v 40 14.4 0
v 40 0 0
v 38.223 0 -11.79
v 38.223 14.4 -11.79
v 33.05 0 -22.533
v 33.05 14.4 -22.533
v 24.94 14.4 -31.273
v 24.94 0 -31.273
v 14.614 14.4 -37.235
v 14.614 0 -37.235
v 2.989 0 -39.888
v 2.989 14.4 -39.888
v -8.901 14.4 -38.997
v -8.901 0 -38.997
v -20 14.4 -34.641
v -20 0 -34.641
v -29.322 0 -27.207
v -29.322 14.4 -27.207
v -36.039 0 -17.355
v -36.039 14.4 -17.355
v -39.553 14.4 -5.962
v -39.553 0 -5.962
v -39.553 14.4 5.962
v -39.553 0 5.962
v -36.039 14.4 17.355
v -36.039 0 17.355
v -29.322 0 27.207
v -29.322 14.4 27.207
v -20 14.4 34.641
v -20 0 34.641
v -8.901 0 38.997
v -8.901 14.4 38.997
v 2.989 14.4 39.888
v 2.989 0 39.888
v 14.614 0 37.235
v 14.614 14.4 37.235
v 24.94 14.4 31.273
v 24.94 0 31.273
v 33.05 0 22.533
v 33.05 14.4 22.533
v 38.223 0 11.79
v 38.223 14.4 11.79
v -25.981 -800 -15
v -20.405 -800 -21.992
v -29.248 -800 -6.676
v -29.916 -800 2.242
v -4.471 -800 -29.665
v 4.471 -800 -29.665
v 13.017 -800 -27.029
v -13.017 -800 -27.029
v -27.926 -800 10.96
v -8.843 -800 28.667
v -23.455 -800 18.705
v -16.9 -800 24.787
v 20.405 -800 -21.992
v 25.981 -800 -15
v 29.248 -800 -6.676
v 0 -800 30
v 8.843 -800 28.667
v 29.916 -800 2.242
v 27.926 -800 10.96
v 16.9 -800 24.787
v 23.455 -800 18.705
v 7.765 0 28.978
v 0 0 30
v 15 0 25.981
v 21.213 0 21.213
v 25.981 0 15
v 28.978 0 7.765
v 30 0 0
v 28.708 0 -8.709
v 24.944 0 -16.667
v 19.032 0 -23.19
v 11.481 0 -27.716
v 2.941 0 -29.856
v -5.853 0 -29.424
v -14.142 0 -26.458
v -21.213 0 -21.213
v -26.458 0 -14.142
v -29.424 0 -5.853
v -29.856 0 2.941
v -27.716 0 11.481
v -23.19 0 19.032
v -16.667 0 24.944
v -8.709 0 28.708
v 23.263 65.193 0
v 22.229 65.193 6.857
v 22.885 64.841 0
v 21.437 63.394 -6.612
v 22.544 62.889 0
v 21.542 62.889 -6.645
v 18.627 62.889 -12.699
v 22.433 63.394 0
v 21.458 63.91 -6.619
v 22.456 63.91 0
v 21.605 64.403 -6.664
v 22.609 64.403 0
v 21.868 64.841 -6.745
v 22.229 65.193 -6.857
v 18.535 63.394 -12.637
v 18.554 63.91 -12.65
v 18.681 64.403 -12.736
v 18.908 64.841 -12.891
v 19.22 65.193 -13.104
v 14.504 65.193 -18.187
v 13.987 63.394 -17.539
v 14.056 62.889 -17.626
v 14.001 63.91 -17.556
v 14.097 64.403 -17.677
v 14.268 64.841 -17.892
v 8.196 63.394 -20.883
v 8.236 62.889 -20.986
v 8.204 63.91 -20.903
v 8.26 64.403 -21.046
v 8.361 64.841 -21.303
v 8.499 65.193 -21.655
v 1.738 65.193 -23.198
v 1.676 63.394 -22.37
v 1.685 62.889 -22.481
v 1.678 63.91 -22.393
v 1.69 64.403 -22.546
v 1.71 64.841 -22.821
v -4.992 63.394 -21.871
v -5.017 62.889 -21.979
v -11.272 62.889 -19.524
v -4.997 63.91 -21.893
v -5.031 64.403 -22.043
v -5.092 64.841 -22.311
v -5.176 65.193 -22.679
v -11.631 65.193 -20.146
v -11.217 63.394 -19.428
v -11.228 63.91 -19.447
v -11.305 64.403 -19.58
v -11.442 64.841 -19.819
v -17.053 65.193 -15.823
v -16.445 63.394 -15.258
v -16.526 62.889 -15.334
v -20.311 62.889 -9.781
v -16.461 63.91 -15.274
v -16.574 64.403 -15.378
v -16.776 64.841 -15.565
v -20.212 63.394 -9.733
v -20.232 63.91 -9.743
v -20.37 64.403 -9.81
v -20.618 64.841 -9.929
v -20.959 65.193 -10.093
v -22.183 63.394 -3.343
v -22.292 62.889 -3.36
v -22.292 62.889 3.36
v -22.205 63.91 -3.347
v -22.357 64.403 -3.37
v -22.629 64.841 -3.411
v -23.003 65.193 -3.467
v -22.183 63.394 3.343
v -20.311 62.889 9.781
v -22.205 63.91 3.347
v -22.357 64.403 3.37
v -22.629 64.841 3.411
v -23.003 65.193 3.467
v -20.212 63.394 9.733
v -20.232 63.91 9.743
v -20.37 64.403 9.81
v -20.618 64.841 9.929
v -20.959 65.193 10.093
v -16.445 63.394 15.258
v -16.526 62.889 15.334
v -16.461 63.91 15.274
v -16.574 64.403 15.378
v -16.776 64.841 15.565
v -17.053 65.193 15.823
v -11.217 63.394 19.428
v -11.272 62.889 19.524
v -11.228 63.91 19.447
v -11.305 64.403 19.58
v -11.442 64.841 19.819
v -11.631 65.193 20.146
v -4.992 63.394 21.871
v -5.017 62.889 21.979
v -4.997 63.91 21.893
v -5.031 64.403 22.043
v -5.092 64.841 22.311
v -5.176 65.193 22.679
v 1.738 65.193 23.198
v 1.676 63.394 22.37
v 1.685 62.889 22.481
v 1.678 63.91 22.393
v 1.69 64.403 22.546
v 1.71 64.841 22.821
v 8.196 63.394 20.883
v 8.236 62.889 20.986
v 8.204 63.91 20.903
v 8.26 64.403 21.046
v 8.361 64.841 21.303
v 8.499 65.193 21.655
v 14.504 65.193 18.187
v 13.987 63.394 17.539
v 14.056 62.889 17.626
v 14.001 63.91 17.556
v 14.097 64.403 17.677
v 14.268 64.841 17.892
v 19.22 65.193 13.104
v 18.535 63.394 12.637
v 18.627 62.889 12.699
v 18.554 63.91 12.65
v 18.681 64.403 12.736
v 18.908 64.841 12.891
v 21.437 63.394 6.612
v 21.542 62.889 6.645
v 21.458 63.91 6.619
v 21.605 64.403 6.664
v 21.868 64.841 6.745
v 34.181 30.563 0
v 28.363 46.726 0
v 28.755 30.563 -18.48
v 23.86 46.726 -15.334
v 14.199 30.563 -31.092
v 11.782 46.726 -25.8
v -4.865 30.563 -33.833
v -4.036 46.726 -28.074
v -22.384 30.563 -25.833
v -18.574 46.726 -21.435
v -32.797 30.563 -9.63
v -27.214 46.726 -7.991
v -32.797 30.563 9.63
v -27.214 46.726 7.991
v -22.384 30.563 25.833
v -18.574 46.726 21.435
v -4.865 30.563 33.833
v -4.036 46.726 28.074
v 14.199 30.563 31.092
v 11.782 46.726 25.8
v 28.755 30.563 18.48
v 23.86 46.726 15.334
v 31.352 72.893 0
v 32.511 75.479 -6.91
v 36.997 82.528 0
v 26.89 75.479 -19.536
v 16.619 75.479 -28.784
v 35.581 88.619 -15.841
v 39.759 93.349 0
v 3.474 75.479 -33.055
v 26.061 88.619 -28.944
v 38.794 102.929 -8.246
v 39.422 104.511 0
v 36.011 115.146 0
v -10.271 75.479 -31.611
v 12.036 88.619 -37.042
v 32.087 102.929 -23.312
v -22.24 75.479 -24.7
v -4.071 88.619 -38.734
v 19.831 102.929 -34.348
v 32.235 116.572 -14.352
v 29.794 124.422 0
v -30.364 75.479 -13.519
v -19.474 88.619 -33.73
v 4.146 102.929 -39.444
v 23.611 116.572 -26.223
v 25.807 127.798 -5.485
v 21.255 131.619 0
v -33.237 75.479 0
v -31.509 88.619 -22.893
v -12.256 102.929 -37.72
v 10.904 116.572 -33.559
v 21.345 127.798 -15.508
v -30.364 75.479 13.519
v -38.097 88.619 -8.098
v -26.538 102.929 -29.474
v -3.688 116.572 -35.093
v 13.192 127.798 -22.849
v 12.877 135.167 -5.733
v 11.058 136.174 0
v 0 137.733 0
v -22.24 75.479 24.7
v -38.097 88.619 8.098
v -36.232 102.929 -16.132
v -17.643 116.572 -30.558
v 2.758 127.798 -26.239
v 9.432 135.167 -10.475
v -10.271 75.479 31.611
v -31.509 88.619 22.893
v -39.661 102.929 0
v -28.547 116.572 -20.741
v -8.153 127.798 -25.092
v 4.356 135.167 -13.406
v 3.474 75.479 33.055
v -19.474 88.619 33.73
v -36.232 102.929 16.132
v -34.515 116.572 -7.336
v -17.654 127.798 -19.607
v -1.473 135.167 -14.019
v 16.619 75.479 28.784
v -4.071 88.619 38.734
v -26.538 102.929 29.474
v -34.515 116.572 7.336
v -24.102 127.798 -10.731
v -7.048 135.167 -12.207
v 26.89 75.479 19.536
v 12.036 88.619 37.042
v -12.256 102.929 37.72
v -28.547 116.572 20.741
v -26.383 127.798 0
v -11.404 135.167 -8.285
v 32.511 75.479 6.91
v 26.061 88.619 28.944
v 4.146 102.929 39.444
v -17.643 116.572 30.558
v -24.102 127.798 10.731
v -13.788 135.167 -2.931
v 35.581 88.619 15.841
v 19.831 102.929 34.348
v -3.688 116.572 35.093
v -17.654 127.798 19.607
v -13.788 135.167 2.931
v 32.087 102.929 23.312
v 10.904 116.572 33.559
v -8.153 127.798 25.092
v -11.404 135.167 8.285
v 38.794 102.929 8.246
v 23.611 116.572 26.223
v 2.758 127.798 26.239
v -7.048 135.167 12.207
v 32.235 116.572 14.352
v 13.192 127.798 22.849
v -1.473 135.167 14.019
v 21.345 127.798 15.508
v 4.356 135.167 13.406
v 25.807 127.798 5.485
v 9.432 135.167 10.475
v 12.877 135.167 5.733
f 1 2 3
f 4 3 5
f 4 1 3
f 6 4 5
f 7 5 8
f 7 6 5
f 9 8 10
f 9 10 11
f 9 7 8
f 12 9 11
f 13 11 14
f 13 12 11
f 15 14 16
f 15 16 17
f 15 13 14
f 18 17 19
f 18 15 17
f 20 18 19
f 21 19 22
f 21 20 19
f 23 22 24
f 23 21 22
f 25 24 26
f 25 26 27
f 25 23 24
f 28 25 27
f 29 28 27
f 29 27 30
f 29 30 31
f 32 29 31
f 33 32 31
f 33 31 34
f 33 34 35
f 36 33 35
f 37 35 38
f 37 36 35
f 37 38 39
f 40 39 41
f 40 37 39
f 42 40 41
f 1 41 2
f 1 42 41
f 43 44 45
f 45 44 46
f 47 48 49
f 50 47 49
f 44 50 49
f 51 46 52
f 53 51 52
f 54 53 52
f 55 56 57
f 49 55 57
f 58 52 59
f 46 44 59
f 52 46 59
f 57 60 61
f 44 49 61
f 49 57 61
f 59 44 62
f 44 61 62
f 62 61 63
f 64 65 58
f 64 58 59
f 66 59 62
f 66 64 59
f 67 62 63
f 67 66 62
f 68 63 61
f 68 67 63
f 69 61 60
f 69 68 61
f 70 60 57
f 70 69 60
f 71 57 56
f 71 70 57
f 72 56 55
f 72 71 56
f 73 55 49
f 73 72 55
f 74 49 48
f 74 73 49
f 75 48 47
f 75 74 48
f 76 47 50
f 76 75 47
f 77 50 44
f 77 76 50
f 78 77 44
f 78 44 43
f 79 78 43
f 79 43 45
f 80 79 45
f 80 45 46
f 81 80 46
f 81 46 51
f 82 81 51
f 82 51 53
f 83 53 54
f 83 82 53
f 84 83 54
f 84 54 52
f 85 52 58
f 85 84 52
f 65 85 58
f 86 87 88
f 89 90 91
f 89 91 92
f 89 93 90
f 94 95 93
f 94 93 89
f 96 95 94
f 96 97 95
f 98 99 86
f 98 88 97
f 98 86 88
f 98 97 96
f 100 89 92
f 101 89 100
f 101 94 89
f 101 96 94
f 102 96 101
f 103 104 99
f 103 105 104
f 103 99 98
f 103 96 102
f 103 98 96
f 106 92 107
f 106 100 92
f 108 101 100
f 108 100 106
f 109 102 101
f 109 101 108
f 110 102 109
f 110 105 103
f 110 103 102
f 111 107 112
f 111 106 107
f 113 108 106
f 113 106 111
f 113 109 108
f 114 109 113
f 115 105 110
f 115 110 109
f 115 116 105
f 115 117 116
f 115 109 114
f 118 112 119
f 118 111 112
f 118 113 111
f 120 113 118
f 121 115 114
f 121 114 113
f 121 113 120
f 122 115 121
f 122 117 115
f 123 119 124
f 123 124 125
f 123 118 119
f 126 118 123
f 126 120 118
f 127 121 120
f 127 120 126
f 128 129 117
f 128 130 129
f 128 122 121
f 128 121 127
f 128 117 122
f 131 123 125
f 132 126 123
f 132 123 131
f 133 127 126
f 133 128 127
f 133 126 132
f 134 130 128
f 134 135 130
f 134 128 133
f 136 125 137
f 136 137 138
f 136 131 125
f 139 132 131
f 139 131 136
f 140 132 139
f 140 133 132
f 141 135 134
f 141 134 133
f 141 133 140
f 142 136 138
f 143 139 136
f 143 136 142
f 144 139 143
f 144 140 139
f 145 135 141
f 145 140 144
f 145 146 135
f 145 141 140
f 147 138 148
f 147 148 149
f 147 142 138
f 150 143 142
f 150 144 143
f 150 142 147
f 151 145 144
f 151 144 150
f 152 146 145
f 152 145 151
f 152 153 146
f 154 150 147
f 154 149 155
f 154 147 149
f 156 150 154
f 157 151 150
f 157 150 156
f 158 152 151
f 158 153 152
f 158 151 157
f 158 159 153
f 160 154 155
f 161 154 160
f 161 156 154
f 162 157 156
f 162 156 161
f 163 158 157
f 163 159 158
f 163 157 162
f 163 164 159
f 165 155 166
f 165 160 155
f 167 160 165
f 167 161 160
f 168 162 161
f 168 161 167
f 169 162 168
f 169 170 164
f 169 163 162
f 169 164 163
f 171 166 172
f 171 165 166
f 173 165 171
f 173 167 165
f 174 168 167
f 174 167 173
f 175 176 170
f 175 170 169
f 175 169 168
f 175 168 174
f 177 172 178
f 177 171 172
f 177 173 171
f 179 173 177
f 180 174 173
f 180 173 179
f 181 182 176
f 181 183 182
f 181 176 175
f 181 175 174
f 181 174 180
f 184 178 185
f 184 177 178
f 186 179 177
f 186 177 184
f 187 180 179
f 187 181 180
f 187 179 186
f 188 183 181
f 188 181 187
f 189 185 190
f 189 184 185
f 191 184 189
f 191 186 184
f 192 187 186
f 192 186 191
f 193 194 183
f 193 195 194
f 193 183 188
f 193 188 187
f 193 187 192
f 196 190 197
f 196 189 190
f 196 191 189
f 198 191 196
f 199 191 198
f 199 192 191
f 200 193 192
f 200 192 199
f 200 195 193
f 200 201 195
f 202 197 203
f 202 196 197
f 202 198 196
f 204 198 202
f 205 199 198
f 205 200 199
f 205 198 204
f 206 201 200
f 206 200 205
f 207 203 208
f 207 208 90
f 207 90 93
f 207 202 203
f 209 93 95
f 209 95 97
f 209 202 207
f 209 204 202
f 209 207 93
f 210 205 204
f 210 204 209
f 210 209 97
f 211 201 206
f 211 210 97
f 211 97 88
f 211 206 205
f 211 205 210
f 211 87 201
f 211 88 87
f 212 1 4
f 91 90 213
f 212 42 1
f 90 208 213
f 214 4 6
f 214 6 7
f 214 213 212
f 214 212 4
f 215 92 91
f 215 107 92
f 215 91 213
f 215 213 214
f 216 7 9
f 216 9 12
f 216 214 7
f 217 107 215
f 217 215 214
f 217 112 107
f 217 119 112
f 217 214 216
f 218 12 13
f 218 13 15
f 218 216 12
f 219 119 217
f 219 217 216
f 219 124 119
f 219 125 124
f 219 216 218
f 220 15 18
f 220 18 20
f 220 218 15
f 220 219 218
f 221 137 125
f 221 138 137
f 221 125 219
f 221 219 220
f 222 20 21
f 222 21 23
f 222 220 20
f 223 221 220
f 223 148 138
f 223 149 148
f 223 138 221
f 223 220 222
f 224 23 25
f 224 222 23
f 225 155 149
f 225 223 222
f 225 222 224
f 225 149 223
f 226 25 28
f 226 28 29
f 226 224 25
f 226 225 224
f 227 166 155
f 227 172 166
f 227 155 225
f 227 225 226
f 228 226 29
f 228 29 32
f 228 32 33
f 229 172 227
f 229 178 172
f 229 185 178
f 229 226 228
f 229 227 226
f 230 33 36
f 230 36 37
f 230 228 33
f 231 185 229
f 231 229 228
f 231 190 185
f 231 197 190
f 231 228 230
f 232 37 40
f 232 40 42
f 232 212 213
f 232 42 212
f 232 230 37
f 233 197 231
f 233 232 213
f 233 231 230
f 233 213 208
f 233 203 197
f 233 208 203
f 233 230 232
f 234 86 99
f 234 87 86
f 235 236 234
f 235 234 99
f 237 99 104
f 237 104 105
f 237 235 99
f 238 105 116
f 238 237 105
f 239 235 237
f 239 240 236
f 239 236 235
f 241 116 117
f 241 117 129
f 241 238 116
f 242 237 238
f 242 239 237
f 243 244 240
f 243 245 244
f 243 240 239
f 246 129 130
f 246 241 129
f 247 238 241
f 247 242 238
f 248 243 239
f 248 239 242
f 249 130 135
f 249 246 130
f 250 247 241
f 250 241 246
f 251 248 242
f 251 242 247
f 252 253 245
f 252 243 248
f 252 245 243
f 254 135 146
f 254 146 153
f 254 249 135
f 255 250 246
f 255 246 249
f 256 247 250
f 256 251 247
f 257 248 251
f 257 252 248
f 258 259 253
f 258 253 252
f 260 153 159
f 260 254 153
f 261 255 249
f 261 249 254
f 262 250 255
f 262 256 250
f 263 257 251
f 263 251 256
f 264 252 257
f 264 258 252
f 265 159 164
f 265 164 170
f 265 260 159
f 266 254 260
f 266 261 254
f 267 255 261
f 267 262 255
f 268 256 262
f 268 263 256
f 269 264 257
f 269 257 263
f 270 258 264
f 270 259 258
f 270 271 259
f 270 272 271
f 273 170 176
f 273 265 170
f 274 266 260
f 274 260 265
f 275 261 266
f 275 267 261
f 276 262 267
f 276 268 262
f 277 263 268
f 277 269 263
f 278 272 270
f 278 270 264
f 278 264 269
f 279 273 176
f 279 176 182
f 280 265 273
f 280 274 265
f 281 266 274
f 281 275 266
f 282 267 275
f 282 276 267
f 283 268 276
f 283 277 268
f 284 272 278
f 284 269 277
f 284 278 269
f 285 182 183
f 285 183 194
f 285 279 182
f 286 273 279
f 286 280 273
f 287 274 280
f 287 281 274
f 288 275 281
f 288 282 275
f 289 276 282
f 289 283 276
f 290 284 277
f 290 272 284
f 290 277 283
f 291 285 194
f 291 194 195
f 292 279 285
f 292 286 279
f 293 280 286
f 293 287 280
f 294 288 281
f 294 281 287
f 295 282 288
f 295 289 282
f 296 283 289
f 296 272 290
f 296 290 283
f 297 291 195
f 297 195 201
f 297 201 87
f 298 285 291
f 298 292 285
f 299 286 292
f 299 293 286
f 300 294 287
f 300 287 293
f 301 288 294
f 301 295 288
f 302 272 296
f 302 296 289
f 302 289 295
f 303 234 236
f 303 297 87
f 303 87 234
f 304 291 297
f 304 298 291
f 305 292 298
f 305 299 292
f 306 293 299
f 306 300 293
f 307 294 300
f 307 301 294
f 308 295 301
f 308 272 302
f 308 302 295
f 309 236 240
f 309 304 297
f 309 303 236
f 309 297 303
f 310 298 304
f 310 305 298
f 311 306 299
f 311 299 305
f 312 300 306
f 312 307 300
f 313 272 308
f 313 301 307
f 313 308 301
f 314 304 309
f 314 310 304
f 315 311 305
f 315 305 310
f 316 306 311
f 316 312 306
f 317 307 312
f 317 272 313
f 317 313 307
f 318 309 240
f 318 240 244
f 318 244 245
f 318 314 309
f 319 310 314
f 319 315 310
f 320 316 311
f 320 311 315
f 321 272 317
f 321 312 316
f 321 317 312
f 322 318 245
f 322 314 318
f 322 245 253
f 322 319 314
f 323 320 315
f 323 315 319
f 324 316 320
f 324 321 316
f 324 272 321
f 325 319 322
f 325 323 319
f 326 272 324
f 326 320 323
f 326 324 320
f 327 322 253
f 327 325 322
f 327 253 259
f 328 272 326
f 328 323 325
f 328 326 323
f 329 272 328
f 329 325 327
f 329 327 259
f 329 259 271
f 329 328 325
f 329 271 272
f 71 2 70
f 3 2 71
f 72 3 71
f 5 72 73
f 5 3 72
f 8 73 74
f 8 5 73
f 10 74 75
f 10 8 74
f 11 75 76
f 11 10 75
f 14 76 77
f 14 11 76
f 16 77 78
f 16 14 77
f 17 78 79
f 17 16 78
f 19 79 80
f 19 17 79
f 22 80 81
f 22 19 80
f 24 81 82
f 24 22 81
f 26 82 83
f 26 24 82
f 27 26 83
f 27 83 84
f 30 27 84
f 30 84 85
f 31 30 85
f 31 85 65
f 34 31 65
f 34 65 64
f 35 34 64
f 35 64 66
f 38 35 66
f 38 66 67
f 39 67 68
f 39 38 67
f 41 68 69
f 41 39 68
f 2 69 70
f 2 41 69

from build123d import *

# Parameters (mm, degrees)
SKETCH1_R           = 30
EXTRUDE1_DEPTH      = 800
SKETCH_1_R          = 10
CUT_EXTRUDE_1_DEPTH = 35.6


# Read off the part's stored shape, not the designer's step: 连接重组1
with BuildPart() as part:
    # Sketch1 → Extrude1 (new body)
    with BuildSketch(Plane(origin=(0, 0, 0), x_dir=(1, 0, 0), z_dir=(0, 1, 0))):
        with Locations(Location((0, 0, 0), (0, 0, 270))):
            Circle(SKETCH1_R)
    extrude(amount=-EXTRUDE1_DEPTH)

    # 草图1 → 切除-拉伸1 (cut)
    with BuildSketch(Plane(origin=(0, 0, 0), x_dir=(1, 0, 0), z_dir=(0, 1, 0))):
        with Locations(Location((0, 0, 0), (0, 0, 270))):
            Circle(SKETCH_1_R)
    extrude(amount=-CUT_EXTRUDE_1_DEPTH, mode=Mode.SUBTRACT)

    # 连接重组1 outline → 连接重组1 (revolve)
    with BuildSketch(Plane.XY):
        with BuildLine():
            ThreePointArc((22.543988515, 62.888907458), (22.516451416, 64.161768918), (23.262631751, 65.193345138))
            ThreePointArc((23.262631751, 65.193345138), (38.089361999, 109.948085758), (0, 137.73332))
            Line((0, 137.73332), (0, -35.6))
            Line((0, -35.6), (10, -35.6))
            Line((10, -35.6), (10, 0))
            Line((10, 0), (30, 0))
            Line((30, 0), (39.999998202, -3.56e-06))
            Line((39.999998202, -3.56e-06), (39.999998202, 14.399991661))
            Line((39.999998202, 14.399991661), (22.543988515, 62.888907458))
        make_face()
    revolve(axis=Axis((0, 0, 0), (0, 1, 0)))


solid = part.part
